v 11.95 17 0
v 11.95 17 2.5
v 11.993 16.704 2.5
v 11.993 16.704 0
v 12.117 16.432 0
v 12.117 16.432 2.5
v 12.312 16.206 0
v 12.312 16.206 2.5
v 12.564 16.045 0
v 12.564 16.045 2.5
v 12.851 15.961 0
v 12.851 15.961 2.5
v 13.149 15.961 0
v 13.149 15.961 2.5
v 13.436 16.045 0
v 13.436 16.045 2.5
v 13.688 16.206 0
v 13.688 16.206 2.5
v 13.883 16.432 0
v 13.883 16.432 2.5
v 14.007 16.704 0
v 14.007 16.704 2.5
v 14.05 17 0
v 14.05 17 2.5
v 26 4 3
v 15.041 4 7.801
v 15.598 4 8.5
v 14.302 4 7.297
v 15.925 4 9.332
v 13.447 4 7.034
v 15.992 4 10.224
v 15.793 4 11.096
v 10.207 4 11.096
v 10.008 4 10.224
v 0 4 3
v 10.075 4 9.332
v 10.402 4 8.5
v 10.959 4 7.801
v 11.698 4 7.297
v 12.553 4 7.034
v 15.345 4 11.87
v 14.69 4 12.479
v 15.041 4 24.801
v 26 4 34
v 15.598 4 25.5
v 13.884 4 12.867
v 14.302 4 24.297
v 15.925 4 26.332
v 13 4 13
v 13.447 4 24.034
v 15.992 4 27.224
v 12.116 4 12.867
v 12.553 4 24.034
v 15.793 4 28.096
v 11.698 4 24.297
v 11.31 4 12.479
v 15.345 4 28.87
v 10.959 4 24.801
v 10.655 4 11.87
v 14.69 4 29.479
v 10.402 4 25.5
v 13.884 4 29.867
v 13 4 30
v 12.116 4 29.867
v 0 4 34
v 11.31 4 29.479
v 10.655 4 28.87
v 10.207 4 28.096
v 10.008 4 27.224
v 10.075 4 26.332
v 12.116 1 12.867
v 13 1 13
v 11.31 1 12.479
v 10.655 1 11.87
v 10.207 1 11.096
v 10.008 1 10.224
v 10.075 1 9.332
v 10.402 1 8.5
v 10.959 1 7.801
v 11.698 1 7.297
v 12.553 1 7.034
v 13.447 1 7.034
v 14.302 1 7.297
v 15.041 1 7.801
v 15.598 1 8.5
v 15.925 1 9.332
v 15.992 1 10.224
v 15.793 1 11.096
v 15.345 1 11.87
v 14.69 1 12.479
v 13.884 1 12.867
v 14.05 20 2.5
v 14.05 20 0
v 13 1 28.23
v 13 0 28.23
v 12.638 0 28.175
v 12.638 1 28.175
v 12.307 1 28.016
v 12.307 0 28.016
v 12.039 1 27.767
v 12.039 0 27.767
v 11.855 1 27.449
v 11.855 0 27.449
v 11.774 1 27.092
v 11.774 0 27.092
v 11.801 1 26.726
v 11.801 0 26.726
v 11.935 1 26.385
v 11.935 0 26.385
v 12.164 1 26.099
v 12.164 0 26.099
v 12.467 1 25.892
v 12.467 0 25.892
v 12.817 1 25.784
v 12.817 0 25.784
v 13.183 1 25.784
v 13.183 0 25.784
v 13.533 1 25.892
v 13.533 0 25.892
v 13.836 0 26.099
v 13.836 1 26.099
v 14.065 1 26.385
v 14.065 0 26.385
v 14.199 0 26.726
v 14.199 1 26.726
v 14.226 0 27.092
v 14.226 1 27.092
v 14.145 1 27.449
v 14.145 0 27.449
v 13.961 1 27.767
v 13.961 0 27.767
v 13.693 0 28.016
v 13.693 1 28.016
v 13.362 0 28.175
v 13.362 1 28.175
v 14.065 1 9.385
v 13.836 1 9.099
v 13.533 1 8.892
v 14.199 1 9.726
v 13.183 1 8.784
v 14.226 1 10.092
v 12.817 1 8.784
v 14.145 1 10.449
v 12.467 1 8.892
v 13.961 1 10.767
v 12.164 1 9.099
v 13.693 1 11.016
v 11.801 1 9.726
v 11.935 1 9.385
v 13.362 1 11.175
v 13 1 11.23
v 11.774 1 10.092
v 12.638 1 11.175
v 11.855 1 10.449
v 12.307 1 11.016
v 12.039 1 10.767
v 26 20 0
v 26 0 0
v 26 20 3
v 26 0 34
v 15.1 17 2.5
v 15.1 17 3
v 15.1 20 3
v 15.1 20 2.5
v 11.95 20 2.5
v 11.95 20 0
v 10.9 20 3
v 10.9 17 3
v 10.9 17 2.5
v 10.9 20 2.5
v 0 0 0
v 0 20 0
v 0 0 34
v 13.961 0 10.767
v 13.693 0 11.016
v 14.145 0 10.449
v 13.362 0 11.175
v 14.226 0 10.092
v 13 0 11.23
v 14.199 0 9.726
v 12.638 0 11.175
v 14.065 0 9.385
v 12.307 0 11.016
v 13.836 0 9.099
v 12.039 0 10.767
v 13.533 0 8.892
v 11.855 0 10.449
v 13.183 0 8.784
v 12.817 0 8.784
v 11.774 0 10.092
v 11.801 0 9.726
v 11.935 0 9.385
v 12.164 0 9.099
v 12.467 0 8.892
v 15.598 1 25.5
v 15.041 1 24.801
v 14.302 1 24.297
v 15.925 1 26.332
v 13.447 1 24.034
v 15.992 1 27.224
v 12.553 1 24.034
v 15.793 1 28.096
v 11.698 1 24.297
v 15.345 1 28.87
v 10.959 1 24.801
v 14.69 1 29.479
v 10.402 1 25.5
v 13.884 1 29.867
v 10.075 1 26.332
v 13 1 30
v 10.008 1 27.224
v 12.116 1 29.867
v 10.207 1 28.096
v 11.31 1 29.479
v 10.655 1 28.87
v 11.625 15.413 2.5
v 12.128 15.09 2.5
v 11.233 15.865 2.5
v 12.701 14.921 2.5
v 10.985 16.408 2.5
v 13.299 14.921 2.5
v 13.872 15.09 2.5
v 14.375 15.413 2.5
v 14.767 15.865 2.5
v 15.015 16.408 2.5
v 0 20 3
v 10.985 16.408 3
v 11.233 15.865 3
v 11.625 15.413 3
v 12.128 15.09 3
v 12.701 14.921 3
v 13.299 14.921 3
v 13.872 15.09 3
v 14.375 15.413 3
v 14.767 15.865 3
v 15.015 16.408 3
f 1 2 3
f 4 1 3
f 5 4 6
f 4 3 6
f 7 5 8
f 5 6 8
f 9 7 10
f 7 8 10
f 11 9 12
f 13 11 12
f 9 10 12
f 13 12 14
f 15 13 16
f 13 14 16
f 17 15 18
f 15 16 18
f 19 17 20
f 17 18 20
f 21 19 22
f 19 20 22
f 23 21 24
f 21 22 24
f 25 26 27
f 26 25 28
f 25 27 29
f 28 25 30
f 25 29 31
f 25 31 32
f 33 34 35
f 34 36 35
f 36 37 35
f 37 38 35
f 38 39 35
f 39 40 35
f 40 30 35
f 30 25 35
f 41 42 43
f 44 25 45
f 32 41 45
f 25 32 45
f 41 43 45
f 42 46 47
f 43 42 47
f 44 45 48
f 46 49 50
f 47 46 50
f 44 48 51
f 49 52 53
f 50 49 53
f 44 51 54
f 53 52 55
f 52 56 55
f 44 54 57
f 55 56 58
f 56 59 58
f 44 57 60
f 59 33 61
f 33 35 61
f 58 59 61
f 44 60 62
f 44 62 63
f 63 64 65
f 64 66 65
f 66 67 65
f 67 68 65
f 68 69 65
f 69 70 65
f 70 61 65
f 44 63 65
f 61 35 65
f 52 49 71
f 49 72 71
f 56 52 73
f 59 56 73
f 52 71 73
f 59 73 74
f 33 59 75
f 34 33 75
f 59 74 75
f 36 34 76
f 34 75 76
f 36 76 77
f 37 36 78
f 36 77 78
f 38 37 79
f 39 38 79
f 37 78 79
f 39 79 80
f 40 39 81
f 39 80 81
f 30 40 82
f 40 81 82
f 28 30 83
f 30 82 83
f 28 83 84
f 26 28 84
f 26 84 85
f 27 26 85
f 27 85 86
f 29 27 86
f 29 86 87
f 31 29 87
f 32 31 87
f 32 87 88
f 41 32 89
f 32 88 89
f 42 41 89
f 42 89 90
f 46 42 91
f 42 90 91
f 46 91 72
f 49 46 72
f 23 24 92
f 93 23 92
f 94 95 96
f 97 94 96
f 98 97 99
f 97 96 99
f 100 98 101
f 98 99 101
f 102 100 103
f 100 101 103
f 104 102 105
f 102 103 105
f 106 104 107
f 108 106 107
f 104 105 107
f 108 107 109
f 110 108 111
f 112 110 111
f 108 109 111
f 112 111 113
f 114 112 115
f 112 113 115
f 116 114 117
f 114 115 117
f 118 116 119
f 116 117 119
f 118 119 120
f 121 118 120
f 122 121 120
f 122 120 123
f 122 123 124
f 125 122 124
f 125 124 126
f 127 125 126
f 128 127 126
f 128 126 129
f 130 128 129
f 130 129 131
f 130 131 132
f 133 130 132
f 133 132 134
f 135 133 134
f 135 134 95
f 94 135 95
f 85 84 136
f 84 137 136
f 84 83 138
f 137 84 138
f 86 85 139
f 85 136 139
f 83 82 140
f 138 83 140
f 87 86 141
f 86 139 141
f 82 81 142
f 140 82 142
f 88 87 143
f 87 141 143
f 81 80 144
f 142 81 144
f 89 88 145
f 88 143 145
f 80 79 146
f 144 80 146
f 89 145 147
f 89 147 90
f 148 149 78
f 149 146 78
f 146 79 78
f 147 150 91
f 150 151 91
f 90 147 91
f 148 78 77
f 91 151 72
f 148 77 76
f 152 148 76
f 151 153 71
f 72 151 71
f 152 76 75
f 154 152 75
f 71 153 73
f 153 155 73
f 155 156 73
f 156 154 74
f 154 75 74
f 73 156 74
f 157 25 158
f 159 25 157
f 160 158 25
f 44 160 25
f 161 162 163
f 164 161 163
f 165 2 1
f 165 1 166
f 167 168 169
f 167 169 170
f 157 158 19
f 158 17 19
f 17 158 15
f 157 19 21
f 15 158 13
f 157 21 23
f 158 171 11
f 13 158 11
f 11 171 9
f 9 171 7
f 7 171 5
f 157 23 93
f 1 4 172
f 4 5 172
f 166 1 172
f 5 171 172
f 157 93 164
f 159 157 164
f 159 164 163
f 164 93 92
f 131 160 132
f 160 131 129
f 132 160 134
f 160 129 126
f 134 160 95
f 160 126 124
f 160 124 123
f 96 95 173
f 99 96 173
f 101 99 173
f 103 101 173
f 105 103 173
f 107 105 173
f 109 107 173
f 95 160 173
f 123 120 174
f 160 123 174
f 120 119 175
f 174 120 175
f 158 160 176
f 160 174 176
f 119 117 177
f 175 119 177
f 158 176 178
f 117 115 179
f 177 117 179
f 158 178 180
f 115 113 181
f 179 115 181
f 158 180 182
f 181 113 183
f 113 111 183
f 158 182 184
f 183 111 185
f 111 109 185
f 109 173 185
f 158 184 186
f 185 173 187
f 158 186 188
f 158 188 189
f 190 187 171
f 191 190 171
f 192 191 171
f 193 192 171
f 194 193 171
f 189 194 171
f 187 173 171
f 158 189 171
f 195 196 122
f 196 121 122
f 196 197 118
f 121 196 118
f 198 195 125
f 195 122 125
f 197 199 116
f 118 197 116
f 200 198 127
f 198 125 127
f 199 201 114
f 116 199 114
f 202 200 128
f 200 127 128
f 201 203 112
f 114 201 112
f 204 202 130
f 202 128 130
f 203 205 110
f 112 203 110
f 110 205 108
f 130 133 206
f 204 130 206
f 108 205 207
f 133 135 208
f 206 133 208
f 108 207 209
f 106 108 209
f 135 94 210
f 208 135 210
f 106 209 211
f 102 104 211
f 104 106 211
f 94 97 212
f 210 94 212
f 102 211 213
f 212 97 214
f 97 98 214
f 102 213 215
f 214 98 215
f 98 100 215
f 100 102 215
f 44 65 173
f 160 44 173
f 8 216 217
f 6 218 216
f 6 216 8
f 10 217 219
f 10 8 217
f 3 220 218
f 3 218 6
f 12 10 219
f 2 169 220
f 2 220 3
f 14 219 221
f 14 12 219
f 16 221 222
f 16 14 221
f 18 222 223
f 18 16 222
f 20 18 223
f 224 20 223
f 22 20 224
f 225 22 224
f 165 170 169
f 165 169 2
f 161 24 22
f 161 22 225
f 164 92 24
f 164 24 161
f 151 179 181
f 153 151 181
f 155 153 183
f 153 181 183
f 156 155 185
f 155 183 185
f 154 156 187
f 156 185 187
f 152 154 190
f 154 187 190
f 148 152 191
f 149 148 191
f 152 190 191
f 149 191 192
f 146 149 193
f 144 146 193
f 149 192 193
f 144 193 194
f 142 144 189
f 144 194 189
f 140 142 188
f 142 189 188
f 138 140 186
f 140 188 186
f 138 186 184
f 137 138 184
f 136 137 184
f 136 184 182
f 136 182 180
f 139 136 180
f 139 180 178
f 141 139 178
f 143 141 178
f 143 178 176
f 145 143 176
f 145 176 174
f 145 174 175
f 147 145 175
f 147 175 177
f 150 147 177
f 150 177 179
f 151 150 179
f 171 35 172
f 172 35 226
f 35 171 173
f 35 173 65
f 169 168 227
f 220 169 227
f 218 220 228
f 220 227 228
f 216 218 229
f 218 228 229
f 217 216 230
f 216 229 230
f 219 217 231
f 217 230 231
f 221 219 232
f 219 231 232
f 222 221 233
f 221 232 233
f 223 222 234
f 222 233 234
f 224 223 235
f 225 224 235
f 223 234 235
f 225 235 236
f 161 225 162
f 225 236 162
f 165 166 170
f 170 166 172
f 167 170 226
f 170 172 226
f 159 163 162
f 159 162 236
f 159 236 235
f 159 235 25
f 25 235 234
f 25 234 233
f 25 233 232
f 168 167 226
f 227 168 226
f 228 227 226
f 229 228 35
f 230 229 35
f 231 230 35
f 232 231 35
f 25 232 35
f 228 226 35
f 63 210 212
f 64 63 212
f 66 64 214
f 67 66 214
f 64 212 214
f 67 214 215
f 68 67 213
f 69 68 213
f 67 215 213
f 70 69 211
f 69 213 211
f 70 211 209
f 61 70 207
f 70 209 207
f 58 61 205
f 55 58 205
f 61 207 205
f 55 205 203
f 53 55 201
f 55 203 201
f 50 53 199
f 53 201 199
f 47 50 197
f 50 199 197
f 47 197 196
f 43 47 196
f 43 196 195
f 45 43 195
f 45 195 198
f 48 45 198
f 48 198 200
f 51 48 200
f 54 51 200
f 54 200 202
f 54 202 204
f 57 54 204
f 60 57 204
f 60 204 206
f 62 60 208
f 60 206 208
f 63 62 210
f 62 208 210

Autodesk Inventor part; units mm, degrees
ref_plane "YZ Plane" through (0, 0, 0) normal (1, 0, 0) x (0, 1, 0)
ref_plane "XZ Plane" through (0, 0, 0) normal (0, 1, 0) x (-1, 0, 0)
ref_plane "XY Plane" through (0, 0, 0) normal (0, 0, 1) x (1, 0, 0)
sketch "Sketch1" plane through (0, 0, 0) normal (1, 0, 0) x (0, 1, 0)
  line L0 (20, 0) -> (20, 3)
  line L1 (20, 3) -> (4, 3)
  line L2 (4, 3) -> (4, 34)
  line L3 (4, 34) -> (0, 34)
  line L4 (0, 34) -> (0, 0)
  line L5 (0, 0) -> (20, 0)
  dimension "d0" = 3
  dimension "d1" = 4
  dimension "d2" = 34
  dimension "d3" = 20
extrude "Extrusion1" add sketch "Sketch1" along normal blind 26
sketch "Sketch2" plane through (0, 4, 34) normal (0, 1, 0) x (1, 0, 0)
  line L0 (0, 31) -> (0, 0) projected
  line L1 (0, 0) -> (26, 0) projected
  line L2 (0, 31) -> (26, 31) projected
  point P0 (0, 34)
  point P1 (13, 7)
  point P2 (13, 24)
  dimension "d6" = 7
  dimension "d8" = 13
  dimension "d16" = 26
  dimension "d17" = 31
  dimension "d19" = 7
hole "Hole1" at (13, 4, 27) at (13, 4, 10) direction (0, -1, 0) diameter 2.459 end through all counterbore diameter 6 counterbore depth 3 thread size "M3x0.5" class "6H" standard "ISO Metric profile"
sketch "Sketch3" plane through (0, 4, 3) normal (0, 0, 1) x (1, 0, 0)
  line L0 (0, 16) -> (0, 0) projected
  line L1 (0, 16) -> (26, 16) projected
  circle A0 centre (13, 13) radius 1.05
  line L2 (11.95, 13) -> (11.95, 16)
  line L3 (14.05, 13) -> (14.05, 16)
  point P0 (0, -4)
  dimension "d20" = 2.1
  dimension "d21" = 13
  dimension "d22" = 3
  dimension "d28" = 26
extrude "Extrusion2" cut sketch "Sketch3" against normal through all
sketch "Sketch4" plane through (0, 4, 3) normal (0, 0, 1) x (1, 0, 0)
  arc A0 (11.95, 13) -> (14.05, 13) centre (13, 13) ccw projected
  circle A1 centre (13, 13) radius 2.1
  line L0 (0, 16) -> (11.95, 16) projected
  line L1 (14.05, 16) -> (26, 16) projected
  line L2 (10.9, 13) -> (10.9, 16)
  line L3 (15.1, 13) -> (15.1, 16)
  line L4 (10.9, 16) -> (15.1, 16)
  point P0 (0, -4)
  dimension "d25" = 4.2
extrude "Extrusion3" cut sketch "Sketch4" against normal blind 0.5
equation "\"d8\" = 0.5 * d16"
equation "\"d19\" = d6"
equation "\"d21\" = 0.5 * d28"
properties part number "SupportSlide" material "Aluminum"
